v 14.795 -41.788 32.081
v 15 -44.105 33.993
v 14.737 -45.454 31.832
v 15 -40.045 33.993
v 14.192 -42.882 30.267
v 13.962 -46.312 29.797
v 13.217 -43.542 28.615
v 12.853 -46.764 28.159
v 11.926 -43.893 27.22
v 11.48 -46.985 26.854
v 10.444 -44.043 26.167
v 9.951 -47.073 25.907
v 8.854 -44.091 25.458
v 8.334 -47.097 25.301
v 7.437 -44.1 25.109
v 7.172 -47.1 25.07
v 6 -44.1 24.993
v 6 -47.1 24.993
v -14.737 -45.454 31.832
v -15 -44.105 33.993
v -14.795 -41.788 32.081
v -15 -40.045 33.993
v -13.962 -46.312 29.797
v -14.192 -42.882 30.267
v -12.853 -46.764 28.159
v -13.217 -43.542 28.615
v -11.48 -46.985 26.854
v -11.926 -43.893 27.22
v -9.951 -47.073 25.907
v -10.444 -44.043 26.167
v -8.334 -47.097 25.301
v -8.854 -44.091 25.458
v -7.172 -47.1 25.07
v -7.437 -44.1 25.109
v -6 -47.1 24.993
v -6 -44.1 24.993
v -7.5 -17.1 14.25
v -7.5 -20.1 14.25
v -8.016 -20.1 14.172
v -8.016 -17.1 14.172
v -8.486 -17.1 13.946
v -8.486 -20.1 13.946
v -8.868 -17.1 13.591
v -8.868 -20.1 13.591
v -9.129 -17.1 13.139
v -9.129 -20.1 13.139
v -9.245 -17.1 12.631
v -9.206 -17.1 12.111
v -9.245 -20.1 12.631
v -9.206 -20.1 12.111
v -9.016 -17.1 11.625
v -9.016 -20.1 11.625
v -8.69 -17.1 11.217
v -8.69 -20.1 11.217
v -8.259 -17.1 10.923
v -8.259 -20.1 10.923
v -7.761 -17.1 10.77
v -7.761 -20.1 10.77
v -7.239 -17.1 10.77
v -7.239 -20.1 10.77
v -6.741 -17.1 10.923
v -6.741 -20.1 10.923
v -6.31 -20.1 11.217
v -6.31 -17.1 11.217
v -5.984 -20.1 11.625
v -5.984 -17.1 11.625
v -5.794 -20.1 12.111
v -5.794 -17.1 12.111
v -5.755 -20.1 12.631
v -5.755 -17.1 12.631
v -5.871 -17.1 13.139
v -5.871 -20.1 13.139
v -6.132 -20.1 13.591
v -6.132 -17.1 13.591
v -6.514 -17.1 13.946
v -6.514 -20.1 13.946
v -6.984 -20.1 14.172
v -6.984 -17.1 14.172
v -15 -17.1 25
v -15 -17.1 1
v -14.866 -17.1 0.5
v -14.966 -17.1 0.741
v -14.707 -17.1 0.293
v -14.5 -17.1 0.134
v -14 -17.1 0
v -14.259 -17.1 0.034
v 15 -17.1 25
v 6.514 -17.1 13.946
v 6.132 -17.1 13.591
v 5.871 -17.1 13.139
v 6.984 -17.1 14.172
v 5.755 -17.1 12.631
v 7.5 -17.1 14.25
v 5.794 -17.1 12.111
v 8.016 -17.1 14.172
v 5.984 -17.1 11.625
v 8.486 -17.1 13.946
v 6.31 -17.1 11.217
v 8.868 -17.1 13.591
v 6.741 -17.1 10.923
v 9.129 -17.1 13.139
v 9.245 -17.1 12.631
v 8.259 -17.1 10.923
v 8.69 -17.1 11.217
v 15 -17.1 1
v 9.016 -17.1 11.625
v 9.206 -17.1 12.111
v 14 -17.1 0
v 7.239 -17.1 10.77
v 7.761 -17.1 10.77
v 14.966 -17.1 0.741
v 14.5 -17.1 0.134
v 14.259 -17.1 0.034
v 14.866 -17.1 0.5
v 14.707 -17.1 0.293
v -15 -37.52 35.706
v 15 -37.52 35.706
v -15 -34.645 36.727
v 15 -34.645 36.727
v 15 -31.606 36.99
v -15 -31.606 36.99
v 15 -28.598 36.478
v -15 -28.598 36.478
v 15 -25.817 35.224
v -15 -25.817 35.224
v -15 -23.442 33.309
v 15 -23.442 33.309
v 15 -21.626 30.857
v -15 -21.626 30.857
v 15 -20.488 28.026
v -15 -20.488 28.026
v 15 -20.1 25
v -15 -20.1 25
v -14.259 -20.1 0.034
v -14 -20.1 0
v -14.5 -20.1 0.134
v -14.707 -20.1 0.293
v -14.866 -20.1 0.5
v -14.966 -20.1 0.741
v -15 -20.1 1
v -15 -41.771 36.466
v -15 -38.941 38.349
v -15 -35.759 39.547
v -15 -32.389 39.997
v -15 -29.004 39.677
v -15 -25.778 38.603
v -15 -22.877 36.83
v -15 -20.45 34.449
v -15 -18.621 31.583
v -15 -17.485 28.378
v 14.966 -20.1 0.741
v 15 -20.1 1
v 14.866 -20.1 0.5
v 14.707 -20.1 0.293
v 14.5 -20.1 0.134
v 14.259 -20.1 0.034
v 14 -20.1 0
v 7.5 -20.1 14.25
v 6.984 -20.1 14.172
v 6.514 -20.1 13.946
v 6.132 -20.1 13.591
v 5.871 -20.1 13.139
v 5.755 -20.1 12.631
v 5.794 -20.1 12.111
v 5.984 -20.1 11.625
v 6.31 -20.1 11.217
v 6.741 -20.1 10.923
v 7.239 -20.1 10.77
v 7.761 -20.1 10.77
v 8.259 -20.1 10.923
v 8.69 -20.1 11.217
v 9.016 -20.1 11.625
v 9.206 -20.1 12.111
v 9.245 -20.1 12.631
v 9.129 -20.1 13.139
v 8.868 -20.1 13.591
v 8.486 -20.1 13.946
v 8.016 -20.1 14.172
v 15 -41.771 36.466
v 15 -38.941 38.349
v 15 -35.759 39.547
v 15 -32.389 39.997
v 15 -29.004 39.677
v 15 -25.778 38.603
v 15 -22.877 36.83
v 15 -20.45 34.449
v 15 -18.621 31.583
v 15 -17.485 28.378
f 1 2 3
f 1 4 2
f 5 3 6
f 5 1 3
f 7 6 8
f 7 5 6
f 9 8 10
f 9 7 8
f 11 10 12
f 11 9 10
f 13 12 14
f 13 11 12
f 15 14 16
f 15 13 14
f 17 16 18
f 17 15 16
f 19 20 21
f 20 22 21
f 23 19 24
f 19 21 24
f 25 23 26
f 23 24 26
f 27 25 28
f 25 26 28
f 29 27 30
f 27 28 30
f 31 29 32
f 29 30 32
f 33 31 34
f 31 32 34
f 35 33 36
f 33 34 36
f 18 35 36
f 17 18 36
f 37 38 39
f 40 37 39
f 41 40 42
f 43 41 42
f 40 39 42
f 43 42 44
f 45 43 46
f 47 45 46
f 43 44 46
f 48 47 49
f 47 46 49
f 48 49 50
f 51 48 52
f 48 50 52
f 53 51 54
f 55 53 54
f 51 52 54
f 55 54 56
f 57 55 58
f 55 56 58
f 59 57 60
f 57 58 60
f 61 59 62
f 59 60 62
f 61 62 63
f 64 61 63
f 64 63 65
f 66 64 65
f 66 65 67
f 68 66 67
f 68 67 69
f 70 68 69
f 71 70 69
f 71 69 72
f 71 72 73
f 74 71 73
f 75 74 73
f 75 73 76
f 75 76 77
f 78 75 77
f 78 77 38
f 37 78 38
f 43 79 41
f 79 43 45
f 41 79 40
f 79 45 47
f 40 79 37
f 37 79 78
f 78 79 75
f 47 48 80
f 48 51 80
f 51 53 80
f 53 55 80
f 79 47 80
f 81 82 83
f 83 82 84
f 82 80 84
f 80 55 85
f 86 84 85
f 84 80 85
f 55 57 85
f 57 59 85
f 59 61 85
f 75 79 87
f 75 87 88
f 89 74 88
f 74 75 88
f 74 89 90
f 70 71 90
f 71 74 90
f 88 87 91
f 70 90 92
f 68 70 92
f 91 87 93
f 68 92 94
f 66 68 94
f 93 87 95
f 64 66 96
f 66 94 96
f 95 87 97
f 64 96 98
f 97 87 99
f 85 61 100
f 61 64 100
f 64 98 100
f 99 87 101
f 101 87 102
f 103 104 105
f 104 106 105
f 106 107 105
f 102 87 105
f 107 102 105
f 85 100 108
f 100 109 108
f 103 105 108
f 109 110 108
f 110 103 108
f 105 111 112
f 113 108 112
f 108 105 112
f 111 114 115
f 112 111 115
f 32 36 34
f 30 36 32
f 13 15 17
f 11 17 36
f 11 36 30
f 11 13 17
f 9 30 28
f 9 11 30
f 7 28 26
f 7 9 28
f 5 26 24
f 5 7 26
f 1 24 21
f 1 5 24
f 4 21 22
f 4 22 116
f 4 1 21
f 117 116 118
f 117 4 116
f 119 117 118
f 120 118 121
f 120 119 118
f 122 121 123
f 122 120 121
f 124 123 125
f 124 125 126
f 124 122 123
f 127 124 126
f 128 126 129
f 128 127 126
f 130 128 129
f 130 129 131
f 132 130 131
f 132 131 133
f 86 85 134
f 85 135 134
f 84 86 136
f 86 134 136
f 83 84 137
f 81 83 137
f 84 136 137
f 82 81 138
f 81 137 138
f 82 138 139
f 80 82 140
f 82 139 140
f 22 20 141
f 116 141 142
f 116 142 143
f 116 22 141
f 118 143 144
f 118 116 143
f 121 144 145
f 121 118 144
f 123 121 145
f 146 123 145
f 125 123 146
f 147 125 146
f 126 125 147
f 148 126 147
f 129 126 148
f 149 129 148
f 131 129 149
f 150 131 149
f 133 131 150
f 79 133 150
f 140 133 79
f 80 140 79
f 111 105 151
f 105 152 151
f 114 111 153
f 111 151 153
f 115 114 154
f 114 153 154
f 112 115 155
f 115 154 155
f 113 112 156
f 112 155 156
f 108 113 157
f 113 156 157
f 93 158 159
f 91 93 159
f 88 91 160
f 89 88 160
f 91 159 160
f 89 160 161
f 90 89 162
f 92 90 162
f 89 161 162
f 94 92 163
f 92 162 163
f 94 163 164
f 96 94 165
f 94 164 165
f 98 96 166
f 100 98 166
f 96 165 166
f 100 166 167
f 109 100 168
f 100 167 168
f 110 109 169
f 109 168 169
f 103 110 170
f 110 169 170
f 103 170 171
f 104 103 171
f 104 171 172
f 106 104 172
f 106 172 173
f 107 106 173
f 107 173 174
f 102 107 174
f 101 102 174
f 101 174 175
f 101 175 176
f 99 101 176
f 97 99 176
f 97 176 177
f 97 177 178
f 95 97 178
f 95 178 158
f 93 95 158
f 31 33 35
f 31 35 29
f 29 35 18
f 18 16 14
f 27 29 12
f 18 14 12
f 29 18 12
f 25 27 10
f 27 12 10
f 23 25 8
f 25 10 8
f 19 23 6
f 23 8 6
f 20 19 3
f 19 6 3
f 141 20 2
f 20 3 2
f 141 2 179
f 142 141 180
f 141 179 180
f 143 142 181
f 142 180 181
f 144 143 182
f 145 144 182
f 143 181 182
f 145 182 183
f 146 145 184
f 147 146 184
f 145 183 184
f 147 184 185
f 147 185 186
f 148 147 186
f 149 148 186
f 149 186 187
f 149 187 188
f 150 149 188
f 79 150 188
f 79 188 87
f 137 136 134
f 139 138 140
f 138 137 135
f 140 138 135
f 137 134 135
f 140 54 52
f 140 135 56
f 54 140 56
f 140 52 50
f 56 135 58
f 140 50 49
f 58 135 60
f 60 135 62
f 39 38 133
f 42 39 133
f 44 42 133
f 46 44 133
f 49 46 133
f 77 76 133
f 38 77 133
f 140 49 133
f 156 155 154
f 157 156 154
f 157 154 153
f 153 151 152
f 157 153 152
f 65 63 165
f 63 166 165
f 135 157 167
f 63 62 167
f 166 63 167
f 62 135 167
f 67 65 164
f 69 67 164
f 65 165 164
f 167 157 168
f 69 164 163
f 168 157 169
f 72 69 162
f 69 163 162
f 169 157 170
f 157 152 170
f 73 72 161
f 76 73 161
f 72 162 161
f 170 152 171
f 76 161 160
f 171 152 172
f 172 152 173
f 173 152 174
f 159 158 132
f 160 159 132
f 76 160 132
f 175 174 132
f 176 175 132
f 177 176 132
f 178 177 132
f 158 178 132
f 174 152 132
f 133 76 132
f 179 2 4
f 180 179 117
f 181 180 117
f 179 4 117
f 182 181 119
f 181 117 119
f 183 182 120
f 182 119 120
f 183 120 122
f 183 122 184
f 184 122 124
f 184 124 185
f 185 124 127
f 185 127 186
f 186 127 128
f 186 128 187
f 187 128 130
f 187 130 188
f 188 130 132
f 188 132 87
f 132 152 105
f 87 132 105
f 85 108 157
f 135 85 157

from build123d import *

# Parameters (mm, degrees)
PAD002_DEPTH            = 30
SKETCH005_R             = 1.75
POCKET009_DEPTH         = 33.001
FILLET009_R             = 9
FILLET010_R             = 1
BODY001_ROLL_ANGLE      = -90
BODY001_PLACEMENT_ANGLE = 90


with BuildPart() as part:
    # Sketch004 (on XY_Plane001 of Origin002) → Pad002 (new body)
    with BuildSketch(Plane.XY):
        with BuildLine():
            Line((0, 25), (-3, 25))
            Line((-3, 25), (-3, 0))
            ThreePointArc((-26.999998, 0.006802), (-15.003401, -12), (-3, 0))
            Line((-29.999998, 0.006802), (-26.999998, 0.006802))
            ThreePointArc((-29.999998, 0.006802), (-15.003401, -15), (0, 0))
            Line((0, 0), (0, 25))
        make_face()
    extrude(amount=PAD002_DEPTH)

    # Sketch005 (on Face2 of Pad002) → Pocket009 (cut, through all)
    with BuildSketch(Plane(origin=(-33, 0, 0), x_dir=(0, -1, 0), z_dir=(-1, 0, 0))):
        with Locations((-12.5, 7.5)):
            Circle(SKETCH005_R)
        with Locations((-12.5, 22.5)):
            Circle(SKETCH005_R)
    extrude(amount=-POCKET009_DEPTH, mode=Mode.SUBTRACT)

    # Fillet009
    fillet009_edges = [part.edges().sort_by_distance(p)[0] for p in [
        (-28.499998, 0.006802, 30),
        (-28.499998, 0.006802, 0),
    ]]
    fillet(fillet009_edges, radius=FILLET009_R)

    # Fillet010
    fillet010_edges = [part.edges().sort_by_distance(p)[0] for p in [
        (-1.5, 25, 30),
        (-1.5, 25, 0),
    ]]
    fillet(fillet010_edges, radius=FILLET010_R)


with BuildPart() as part_1:
    # Body001 roll: moved
    add(part.part.rotate(Axis((0, 0, 0), (1, 0, 0)), BODY001_ROLL_ANGLE))


with BuildPart() as part_2:
    # Body001 placement: moved
    add(part_1.part.moved(Location((15, -17.1, 25))).rotate(Axis((15, -17.1, 25), (0, 0, 1)), BODY001_PLACEMENT_ANGLE))


solid = part_2.part
